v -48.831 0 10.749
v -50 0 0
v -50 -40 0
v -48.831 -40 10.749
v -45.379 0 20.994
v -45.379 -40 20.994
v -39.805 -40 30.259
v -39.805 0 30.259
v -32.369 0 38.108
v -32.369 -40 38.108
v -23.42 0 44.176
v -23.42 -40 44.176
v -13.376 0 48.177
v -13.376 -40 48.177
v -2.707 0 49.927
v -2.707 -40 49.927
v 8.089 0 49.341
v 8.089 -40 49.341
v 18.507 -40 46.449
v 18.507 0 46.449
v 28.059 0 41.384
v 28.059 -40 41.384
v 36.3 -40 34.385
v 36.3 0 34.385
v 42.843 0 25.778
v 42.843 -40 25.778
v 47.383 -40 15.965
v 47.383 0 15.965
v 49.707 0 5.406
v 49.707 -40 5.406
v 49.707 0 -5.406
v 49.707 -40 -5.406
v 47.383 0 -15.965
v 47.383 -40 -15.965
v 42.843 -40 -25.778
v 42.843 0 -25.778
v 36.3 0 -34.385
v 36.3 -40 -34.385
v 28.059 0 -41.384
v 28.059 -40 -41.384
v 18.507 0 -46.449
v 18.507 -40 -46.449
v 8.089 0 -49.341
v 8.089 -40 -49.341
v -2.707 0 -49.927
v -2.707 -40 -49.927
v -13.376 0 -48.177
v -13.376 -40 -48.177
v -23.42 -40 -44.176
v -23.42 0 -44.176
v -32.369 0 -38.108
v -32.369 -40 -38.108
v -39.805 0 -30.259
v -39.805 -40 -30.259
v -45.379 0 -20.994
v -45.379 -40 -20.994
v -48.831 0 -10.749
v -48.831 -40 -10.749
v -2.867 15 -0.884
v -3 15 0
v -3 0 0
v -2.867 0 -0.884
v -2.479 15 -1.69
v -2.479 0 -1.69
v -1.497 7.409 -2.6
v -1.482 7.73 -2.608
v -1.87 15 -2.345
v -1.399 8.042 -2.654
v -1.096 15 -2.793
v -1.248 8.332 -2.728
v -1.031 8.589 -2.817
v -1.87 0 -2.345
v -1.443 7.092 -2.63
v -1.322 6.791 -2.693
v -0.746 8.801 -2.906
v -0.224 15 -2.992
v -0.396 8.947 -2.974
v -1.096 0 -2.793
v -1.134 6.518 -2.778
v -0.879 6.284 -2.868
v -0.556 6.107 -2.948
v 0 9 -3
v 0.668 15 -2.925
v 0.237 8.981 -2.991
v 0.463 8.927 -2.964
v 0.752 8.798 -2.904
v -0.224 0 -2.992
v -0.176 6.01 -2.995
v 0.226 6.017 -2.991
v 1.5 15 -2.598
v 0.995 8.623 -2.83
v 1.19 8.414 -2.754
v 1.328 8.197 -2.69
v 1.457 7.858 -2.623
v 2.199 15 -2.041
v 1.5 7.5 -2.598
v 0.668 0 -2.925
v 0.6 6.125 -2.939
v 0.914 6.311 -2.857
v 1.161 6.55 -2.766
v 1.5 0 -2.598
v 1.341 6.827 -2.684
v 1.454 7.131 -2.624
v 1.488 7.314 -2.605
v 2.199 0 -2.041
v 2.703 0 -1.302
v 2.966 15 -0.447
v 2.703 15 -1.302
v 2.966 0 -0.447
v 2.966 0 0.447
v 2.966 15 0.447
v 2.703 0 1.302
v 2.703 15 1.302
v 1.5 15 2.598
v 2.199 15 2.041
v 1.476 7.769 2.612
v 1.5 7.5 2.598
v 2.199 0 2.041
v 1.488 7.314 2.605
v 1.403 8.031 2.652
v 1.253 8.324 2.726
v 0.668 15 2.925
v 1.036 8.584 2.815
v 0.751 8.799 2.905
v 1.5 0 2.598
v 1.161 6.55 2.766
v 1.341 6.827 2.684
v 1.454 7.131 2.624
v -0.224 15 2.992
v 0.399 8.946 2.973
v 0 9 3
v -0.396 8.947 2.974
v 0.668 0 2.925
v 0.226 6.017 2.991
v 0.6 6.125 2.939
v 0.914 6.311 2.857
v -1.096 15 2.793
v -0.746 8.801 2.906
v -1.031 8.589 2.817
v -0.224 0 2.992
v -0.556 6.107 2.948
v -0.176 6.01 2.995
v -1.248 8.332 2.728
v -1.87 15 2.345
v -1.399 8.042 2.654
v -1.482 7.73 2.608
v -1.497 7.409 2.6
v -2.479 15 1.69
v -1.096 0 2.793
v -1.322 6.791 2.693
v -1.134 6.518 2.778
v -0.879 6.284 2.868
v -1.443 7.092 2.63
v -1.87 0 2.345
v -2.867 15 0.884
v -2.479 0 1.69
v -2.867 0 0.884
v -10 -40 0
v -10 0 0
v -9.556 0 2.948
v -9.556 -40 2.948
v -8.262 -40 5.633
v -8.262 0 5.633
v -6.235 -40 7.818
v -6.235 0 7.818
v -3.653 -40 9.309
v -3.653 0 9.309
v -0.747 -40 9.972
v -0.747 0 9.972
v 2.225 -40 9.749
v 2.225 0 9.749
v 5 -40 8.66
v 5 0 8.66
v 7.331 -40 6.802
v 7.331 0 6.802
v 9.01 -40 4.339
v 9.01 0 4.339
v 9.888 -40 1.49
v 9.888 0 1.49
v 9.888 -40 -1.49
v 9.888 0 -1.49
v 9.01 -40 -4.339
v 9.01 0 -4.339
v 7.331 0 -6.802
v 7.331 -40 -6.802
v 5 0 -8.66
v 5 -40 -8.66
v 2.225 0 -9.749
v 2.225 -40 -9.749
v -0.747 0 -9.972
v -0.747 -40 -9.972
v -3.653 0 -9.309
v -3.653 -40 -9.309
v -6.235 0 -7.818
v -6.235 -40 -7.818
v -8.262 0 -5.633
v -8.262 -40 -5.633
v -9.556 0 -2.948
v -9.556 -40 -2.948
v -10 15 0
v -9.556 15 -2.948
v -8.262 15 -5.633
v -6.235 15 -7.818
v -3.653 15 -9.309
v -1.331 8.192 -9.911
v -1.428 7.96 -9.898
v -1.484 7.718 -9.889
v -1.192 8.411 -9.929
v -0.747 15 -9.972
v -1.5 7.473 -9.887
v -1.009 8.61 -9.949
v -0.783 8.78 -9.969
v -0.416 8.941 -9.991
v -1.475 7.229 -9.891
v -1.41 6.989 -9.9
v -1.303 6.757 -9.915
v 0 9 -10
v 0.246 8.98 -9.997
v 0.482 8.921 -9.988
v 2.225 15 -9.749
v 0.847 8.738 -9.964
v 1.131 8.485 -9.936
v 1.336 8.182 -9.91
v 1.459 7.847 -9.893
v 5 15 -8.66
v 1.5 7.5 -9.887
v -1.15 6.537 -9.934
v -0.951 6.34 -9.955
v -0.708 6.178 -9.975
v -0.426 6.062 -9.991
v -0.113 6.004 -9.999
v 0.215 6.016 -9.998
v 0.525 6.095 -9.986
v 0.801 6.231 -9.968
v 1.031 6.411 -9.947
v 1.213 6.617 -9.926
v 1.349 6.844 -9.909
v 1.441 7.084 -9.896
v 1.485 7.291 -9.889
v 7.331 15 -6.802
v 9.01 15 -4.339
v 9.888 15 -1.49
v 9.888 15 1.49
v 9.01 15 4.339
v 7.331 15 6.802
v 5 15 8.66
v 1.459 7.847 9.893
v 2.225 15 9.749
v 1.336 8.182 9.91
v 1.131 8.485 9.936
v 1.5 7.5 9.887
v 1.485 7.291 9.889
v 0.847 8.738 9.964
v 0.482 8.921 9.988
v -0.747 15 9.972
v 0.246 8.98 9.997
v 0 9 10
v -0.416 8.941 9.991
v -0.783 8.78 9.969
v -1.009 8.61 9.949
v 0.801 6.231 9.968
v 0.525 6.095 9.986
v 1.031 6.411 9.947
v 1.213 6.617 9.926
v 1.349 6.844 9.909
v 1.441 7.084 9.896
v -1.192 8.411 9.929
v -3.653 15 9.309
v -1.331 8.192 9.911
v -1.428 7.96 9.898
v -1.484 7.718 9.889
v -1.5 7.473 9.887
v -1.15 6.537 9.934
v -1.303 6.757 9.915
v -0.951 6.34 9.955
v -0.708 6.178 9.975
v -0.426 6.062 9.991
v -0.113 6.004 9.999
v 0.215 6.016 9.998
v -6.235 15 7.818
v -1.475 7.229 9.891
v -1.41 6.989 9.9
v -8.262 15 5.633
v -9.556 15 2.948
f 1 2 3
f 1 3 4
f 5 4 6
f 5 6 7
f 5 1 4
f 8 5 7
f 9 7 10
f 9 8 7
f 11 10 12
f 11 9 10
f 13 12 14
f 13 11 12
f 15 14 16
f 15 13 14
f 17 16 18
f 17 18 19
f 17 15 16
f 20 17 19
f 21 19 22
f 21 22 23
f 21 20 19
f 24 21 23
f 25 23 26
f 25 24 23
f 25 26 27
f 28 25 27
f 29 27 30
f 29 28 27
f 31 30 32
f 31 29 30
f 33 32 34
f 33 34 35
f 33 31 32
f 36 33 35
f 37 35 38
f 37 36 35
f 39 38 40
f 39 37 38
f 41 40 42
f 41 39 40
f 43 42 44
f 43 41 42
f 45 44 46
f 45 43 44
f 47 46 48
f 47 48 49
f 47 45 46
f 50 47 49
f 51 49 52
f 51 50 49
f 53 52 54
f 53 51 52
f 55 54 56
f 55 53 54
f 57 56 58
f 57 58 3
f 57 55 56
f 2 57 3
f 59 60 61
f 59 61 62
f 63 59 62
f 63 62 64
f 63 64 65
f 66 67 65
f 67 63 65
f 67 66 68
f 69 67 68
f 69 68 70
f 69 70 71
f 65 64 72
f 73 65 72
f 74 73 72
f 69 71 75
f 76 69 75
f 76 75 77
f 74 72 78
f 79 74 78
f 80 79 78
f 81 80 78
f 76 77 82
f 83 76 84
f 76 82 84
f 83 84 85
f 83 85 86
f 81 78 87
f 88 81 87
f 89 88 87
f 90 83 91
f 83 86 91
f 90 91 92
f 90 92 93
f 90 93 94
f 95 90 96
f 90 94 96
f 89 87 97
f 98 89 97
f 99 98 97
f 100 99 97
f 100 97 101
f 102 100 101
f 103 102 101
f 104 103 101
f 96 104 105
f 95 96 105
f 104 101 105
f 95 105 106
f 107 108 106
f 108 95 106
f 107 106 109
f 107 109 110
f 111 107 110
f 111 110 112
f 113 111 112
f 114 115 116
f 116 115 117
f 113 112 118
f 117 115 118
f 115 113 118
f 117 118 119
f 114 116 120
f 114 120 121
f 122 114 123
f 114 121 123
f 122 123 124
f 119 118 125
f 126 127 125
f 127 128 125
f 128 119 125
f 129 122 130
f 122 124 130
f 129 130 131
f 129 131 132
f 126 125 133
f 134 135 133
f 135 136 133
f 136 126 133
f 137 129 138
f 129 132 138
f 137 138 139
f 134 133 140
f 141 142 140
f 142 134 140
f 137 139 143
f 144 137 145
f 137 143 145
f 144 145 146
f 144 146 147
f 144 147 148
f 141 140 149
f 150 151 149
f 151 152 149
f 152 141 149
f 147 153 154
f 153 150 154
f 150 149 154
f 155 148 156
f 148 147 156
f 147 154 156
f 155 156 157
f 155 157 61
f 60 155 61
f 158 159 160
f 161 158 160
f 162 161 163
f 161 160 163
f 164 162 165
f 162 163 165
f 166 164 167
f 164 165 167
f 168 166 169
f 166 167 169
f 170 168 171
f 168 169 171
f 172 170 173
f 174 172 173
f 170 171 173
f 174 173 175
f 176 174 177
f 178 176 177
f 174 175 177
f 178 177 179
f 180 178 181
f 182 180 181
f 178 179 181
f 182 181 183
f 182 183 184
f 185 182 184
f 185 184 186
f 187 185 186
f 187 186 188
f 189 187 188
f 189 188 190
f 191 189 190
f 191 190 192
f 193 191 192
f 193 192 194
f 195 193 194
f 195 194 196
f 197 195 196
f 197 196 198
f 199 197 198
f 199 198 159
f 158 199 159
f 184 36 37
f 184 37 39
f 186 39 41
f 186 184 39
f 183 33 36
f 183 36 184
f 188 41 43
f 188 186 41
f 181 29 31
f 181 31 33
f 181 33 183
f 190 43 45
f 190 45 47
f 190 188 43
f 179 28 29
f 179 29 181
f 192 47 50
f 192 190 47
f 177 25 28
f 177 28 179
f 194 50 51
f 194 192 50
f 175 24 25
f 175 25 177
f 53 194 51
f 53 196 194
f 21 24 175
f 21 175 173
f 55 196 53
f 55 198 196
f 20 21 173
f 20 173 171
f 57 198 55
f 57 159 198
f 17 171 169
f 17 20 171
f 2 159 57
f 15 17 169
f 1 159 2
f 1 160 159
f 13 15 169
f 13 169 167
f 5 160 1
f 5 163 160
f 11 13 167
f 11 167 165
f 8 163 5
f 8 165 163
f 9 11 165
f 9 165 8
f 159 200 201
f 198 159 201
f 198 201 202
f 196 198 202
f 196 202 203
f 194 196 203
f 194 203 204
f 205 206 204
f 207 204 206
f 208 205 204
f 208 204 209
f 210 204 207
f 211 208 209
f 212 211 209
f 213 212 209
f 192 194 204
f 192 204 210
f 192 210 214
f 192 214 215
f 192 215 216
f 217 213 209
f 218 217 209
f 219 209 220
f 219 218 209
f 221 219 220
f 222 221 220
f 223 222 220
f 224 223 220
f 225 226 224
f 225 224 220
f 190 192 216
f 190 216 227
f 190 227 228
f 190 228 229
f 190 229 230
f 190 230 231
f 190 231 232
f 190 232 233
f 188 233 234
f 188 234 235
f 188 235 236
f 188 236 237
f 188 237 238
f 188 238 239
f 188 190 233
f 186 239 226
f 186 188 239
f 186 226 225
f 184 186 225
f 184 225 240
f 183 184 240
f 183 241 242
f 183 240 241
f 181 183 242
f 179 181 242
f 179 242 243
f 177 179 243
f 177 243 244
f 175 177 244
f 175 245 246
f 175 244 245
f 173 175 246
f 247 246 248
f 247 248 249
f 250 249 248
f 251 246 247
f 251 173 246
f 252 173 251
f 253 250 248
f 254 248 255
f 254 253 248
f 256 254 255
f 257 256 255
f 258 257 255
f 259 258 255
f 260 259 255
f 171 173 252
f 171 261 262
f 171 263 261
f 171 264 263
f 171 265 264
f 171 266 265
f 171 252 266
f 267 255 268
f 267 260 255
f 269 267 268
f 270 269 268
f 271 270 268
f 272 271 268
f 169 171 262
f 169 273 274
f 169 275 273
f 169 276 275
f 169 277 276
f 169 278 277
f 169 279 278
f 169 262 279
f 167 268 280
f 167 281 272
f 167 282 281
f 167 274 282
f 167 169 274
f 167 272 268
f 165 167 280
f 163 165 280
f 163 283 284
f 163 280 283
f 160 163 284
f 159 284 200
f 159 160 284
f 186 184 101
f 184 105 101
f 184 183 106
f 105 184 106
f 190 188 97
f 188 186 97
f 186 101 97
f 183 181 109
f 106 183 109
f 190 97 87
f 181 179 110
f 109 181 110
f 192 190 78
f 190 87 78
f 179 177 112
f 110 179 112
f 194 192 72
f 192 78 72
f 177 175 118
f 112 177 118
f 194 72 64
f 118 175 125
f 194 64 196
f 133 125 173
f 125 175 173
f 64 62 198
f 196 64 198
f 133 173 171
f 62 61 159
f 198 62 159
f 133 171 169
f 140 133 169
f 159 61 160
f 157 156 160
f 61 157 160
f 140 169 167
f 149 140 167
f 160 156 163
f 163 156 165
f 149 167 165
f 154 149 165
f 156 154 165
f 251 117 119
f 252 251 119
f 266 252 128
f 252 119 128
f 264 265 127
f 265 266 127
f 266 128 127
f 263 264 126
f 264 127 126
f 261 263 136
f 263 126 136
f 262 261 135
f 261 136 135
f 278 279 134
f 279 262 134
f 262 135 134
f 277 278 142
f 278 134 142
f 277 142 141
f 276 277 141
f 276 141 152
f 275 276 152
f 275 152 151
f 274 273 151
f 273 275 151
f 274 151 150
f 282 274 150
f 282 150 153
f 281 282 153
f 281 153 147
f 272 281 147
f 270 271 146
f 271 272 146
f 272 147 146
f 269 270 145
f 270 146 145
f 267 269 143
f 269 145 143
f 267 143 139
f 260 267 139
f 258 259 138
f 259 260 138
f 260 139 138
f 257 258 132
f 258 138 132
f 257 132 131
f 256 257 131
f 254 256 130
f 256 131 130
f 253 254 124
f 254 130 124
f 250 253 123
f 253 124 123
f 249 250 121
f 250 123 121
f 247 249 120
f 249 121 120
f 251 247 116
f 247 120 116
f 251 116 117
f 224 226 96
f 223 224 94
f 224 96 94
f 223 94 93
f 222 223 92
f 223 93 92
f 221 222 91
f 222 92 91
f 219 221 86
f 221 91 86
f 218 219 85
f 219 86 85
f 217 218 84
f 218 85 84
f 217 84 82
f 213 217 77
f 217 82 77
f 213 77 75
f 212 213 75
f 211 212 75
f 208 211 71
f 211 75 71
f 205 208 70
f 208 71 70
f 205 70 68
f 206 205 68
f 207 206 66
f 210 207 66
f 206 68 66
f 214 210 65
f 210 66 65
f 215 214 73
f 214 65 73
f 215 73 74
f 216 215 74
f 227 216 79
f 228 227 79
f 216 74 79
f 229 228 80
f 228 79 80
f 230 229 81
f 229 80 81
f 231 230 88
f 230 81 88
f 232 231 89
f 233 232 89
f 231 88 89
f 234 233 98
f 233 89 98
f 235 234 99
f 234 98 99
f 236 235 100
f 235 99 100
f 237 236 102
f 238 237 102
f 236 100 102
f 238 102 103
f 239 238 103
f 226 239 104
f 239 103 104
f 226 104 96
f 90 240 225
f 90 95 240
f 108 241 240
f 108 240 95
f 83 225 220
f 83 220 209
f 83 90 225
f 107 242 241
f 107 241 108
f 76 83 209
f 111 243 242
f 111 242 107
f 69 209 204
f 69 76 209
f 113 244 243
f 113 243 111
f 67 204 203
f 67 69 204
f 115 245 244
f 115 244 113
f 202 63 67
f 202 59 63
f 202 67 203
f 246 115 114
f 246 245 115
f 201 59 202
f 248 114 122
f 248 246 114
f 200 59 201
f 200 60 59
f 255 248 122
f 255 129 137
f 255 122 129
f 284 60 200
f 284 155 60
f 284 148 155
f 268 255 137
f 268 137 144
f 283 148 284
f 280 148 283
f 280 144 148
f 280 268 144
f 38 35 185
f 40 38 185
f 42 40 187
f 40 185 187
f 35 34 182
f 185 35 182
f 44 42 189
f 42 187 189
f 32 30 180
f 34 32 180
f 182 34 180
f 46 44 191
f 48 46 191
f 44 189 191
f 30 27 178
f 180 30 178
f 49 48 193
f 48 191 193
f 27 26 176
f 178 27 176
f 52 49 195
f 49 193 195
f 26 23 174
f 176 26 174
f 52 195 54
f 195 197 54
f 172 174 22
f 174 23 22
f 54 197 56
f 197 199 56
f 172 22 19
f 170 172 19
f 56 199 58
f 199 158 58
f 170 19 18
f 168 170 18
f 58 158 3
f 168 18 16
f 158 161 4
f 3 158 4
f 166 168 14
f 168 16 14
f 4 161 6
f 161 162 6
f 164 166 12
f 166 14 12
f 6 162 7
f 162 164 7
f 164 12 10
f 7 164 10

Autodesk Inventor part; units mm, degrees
ref_plane "YZ Plane" through (0, 0, 0) normal (1, 0, 0) x (0, 1, 0)
ref_plane "XZ Plane" through (0, 0, 0) normal (0, 1, 0) x (-1, 0, 0)
sketch "Sketch1" plane through (0, 0, 0) normal (0, 1, 0) x (-1, 0, 0)
  circle A0 centre (0, 0) radius 50
  circle A1 centre (0, 0) radius 10
  circle A2 centre (0, 0) radius 3
  line L0 (10, 0) -> (-10, 0)
  dimension "d0" = 100
  dimension "d1" = 20
  dimension "d2" = 6
extrude "Extrusion1" add sketch "Sketch1" against normal blind 40
extrude "Extrusion2" add sketch "Sketch1" along normal blind 15 contours L0 A2 A1 | A1 L0 A2
ref_plane "Work Plane1" through (-10, 0, 0) normal (0, 0, 1) x (1, 0, 0)
sketch "Sketch2" plane through (-10, 0, 0) normal (0, 0, 1) x (1, 0, 0)
  line L0 (20, 15) -> (0, 15) projected
  line L1 (10, 15) -> (10, 7.5)
  circle A0 centre (10, 7.5) radius 1.5
  point P0 (10, 0)
  dimension "d8" = 7.5
  dimension "d9" = 3
extrude "Extrusion3" cut sketch "Sketch2" along normal mid plane 30
properties part number "omni_wheel"
